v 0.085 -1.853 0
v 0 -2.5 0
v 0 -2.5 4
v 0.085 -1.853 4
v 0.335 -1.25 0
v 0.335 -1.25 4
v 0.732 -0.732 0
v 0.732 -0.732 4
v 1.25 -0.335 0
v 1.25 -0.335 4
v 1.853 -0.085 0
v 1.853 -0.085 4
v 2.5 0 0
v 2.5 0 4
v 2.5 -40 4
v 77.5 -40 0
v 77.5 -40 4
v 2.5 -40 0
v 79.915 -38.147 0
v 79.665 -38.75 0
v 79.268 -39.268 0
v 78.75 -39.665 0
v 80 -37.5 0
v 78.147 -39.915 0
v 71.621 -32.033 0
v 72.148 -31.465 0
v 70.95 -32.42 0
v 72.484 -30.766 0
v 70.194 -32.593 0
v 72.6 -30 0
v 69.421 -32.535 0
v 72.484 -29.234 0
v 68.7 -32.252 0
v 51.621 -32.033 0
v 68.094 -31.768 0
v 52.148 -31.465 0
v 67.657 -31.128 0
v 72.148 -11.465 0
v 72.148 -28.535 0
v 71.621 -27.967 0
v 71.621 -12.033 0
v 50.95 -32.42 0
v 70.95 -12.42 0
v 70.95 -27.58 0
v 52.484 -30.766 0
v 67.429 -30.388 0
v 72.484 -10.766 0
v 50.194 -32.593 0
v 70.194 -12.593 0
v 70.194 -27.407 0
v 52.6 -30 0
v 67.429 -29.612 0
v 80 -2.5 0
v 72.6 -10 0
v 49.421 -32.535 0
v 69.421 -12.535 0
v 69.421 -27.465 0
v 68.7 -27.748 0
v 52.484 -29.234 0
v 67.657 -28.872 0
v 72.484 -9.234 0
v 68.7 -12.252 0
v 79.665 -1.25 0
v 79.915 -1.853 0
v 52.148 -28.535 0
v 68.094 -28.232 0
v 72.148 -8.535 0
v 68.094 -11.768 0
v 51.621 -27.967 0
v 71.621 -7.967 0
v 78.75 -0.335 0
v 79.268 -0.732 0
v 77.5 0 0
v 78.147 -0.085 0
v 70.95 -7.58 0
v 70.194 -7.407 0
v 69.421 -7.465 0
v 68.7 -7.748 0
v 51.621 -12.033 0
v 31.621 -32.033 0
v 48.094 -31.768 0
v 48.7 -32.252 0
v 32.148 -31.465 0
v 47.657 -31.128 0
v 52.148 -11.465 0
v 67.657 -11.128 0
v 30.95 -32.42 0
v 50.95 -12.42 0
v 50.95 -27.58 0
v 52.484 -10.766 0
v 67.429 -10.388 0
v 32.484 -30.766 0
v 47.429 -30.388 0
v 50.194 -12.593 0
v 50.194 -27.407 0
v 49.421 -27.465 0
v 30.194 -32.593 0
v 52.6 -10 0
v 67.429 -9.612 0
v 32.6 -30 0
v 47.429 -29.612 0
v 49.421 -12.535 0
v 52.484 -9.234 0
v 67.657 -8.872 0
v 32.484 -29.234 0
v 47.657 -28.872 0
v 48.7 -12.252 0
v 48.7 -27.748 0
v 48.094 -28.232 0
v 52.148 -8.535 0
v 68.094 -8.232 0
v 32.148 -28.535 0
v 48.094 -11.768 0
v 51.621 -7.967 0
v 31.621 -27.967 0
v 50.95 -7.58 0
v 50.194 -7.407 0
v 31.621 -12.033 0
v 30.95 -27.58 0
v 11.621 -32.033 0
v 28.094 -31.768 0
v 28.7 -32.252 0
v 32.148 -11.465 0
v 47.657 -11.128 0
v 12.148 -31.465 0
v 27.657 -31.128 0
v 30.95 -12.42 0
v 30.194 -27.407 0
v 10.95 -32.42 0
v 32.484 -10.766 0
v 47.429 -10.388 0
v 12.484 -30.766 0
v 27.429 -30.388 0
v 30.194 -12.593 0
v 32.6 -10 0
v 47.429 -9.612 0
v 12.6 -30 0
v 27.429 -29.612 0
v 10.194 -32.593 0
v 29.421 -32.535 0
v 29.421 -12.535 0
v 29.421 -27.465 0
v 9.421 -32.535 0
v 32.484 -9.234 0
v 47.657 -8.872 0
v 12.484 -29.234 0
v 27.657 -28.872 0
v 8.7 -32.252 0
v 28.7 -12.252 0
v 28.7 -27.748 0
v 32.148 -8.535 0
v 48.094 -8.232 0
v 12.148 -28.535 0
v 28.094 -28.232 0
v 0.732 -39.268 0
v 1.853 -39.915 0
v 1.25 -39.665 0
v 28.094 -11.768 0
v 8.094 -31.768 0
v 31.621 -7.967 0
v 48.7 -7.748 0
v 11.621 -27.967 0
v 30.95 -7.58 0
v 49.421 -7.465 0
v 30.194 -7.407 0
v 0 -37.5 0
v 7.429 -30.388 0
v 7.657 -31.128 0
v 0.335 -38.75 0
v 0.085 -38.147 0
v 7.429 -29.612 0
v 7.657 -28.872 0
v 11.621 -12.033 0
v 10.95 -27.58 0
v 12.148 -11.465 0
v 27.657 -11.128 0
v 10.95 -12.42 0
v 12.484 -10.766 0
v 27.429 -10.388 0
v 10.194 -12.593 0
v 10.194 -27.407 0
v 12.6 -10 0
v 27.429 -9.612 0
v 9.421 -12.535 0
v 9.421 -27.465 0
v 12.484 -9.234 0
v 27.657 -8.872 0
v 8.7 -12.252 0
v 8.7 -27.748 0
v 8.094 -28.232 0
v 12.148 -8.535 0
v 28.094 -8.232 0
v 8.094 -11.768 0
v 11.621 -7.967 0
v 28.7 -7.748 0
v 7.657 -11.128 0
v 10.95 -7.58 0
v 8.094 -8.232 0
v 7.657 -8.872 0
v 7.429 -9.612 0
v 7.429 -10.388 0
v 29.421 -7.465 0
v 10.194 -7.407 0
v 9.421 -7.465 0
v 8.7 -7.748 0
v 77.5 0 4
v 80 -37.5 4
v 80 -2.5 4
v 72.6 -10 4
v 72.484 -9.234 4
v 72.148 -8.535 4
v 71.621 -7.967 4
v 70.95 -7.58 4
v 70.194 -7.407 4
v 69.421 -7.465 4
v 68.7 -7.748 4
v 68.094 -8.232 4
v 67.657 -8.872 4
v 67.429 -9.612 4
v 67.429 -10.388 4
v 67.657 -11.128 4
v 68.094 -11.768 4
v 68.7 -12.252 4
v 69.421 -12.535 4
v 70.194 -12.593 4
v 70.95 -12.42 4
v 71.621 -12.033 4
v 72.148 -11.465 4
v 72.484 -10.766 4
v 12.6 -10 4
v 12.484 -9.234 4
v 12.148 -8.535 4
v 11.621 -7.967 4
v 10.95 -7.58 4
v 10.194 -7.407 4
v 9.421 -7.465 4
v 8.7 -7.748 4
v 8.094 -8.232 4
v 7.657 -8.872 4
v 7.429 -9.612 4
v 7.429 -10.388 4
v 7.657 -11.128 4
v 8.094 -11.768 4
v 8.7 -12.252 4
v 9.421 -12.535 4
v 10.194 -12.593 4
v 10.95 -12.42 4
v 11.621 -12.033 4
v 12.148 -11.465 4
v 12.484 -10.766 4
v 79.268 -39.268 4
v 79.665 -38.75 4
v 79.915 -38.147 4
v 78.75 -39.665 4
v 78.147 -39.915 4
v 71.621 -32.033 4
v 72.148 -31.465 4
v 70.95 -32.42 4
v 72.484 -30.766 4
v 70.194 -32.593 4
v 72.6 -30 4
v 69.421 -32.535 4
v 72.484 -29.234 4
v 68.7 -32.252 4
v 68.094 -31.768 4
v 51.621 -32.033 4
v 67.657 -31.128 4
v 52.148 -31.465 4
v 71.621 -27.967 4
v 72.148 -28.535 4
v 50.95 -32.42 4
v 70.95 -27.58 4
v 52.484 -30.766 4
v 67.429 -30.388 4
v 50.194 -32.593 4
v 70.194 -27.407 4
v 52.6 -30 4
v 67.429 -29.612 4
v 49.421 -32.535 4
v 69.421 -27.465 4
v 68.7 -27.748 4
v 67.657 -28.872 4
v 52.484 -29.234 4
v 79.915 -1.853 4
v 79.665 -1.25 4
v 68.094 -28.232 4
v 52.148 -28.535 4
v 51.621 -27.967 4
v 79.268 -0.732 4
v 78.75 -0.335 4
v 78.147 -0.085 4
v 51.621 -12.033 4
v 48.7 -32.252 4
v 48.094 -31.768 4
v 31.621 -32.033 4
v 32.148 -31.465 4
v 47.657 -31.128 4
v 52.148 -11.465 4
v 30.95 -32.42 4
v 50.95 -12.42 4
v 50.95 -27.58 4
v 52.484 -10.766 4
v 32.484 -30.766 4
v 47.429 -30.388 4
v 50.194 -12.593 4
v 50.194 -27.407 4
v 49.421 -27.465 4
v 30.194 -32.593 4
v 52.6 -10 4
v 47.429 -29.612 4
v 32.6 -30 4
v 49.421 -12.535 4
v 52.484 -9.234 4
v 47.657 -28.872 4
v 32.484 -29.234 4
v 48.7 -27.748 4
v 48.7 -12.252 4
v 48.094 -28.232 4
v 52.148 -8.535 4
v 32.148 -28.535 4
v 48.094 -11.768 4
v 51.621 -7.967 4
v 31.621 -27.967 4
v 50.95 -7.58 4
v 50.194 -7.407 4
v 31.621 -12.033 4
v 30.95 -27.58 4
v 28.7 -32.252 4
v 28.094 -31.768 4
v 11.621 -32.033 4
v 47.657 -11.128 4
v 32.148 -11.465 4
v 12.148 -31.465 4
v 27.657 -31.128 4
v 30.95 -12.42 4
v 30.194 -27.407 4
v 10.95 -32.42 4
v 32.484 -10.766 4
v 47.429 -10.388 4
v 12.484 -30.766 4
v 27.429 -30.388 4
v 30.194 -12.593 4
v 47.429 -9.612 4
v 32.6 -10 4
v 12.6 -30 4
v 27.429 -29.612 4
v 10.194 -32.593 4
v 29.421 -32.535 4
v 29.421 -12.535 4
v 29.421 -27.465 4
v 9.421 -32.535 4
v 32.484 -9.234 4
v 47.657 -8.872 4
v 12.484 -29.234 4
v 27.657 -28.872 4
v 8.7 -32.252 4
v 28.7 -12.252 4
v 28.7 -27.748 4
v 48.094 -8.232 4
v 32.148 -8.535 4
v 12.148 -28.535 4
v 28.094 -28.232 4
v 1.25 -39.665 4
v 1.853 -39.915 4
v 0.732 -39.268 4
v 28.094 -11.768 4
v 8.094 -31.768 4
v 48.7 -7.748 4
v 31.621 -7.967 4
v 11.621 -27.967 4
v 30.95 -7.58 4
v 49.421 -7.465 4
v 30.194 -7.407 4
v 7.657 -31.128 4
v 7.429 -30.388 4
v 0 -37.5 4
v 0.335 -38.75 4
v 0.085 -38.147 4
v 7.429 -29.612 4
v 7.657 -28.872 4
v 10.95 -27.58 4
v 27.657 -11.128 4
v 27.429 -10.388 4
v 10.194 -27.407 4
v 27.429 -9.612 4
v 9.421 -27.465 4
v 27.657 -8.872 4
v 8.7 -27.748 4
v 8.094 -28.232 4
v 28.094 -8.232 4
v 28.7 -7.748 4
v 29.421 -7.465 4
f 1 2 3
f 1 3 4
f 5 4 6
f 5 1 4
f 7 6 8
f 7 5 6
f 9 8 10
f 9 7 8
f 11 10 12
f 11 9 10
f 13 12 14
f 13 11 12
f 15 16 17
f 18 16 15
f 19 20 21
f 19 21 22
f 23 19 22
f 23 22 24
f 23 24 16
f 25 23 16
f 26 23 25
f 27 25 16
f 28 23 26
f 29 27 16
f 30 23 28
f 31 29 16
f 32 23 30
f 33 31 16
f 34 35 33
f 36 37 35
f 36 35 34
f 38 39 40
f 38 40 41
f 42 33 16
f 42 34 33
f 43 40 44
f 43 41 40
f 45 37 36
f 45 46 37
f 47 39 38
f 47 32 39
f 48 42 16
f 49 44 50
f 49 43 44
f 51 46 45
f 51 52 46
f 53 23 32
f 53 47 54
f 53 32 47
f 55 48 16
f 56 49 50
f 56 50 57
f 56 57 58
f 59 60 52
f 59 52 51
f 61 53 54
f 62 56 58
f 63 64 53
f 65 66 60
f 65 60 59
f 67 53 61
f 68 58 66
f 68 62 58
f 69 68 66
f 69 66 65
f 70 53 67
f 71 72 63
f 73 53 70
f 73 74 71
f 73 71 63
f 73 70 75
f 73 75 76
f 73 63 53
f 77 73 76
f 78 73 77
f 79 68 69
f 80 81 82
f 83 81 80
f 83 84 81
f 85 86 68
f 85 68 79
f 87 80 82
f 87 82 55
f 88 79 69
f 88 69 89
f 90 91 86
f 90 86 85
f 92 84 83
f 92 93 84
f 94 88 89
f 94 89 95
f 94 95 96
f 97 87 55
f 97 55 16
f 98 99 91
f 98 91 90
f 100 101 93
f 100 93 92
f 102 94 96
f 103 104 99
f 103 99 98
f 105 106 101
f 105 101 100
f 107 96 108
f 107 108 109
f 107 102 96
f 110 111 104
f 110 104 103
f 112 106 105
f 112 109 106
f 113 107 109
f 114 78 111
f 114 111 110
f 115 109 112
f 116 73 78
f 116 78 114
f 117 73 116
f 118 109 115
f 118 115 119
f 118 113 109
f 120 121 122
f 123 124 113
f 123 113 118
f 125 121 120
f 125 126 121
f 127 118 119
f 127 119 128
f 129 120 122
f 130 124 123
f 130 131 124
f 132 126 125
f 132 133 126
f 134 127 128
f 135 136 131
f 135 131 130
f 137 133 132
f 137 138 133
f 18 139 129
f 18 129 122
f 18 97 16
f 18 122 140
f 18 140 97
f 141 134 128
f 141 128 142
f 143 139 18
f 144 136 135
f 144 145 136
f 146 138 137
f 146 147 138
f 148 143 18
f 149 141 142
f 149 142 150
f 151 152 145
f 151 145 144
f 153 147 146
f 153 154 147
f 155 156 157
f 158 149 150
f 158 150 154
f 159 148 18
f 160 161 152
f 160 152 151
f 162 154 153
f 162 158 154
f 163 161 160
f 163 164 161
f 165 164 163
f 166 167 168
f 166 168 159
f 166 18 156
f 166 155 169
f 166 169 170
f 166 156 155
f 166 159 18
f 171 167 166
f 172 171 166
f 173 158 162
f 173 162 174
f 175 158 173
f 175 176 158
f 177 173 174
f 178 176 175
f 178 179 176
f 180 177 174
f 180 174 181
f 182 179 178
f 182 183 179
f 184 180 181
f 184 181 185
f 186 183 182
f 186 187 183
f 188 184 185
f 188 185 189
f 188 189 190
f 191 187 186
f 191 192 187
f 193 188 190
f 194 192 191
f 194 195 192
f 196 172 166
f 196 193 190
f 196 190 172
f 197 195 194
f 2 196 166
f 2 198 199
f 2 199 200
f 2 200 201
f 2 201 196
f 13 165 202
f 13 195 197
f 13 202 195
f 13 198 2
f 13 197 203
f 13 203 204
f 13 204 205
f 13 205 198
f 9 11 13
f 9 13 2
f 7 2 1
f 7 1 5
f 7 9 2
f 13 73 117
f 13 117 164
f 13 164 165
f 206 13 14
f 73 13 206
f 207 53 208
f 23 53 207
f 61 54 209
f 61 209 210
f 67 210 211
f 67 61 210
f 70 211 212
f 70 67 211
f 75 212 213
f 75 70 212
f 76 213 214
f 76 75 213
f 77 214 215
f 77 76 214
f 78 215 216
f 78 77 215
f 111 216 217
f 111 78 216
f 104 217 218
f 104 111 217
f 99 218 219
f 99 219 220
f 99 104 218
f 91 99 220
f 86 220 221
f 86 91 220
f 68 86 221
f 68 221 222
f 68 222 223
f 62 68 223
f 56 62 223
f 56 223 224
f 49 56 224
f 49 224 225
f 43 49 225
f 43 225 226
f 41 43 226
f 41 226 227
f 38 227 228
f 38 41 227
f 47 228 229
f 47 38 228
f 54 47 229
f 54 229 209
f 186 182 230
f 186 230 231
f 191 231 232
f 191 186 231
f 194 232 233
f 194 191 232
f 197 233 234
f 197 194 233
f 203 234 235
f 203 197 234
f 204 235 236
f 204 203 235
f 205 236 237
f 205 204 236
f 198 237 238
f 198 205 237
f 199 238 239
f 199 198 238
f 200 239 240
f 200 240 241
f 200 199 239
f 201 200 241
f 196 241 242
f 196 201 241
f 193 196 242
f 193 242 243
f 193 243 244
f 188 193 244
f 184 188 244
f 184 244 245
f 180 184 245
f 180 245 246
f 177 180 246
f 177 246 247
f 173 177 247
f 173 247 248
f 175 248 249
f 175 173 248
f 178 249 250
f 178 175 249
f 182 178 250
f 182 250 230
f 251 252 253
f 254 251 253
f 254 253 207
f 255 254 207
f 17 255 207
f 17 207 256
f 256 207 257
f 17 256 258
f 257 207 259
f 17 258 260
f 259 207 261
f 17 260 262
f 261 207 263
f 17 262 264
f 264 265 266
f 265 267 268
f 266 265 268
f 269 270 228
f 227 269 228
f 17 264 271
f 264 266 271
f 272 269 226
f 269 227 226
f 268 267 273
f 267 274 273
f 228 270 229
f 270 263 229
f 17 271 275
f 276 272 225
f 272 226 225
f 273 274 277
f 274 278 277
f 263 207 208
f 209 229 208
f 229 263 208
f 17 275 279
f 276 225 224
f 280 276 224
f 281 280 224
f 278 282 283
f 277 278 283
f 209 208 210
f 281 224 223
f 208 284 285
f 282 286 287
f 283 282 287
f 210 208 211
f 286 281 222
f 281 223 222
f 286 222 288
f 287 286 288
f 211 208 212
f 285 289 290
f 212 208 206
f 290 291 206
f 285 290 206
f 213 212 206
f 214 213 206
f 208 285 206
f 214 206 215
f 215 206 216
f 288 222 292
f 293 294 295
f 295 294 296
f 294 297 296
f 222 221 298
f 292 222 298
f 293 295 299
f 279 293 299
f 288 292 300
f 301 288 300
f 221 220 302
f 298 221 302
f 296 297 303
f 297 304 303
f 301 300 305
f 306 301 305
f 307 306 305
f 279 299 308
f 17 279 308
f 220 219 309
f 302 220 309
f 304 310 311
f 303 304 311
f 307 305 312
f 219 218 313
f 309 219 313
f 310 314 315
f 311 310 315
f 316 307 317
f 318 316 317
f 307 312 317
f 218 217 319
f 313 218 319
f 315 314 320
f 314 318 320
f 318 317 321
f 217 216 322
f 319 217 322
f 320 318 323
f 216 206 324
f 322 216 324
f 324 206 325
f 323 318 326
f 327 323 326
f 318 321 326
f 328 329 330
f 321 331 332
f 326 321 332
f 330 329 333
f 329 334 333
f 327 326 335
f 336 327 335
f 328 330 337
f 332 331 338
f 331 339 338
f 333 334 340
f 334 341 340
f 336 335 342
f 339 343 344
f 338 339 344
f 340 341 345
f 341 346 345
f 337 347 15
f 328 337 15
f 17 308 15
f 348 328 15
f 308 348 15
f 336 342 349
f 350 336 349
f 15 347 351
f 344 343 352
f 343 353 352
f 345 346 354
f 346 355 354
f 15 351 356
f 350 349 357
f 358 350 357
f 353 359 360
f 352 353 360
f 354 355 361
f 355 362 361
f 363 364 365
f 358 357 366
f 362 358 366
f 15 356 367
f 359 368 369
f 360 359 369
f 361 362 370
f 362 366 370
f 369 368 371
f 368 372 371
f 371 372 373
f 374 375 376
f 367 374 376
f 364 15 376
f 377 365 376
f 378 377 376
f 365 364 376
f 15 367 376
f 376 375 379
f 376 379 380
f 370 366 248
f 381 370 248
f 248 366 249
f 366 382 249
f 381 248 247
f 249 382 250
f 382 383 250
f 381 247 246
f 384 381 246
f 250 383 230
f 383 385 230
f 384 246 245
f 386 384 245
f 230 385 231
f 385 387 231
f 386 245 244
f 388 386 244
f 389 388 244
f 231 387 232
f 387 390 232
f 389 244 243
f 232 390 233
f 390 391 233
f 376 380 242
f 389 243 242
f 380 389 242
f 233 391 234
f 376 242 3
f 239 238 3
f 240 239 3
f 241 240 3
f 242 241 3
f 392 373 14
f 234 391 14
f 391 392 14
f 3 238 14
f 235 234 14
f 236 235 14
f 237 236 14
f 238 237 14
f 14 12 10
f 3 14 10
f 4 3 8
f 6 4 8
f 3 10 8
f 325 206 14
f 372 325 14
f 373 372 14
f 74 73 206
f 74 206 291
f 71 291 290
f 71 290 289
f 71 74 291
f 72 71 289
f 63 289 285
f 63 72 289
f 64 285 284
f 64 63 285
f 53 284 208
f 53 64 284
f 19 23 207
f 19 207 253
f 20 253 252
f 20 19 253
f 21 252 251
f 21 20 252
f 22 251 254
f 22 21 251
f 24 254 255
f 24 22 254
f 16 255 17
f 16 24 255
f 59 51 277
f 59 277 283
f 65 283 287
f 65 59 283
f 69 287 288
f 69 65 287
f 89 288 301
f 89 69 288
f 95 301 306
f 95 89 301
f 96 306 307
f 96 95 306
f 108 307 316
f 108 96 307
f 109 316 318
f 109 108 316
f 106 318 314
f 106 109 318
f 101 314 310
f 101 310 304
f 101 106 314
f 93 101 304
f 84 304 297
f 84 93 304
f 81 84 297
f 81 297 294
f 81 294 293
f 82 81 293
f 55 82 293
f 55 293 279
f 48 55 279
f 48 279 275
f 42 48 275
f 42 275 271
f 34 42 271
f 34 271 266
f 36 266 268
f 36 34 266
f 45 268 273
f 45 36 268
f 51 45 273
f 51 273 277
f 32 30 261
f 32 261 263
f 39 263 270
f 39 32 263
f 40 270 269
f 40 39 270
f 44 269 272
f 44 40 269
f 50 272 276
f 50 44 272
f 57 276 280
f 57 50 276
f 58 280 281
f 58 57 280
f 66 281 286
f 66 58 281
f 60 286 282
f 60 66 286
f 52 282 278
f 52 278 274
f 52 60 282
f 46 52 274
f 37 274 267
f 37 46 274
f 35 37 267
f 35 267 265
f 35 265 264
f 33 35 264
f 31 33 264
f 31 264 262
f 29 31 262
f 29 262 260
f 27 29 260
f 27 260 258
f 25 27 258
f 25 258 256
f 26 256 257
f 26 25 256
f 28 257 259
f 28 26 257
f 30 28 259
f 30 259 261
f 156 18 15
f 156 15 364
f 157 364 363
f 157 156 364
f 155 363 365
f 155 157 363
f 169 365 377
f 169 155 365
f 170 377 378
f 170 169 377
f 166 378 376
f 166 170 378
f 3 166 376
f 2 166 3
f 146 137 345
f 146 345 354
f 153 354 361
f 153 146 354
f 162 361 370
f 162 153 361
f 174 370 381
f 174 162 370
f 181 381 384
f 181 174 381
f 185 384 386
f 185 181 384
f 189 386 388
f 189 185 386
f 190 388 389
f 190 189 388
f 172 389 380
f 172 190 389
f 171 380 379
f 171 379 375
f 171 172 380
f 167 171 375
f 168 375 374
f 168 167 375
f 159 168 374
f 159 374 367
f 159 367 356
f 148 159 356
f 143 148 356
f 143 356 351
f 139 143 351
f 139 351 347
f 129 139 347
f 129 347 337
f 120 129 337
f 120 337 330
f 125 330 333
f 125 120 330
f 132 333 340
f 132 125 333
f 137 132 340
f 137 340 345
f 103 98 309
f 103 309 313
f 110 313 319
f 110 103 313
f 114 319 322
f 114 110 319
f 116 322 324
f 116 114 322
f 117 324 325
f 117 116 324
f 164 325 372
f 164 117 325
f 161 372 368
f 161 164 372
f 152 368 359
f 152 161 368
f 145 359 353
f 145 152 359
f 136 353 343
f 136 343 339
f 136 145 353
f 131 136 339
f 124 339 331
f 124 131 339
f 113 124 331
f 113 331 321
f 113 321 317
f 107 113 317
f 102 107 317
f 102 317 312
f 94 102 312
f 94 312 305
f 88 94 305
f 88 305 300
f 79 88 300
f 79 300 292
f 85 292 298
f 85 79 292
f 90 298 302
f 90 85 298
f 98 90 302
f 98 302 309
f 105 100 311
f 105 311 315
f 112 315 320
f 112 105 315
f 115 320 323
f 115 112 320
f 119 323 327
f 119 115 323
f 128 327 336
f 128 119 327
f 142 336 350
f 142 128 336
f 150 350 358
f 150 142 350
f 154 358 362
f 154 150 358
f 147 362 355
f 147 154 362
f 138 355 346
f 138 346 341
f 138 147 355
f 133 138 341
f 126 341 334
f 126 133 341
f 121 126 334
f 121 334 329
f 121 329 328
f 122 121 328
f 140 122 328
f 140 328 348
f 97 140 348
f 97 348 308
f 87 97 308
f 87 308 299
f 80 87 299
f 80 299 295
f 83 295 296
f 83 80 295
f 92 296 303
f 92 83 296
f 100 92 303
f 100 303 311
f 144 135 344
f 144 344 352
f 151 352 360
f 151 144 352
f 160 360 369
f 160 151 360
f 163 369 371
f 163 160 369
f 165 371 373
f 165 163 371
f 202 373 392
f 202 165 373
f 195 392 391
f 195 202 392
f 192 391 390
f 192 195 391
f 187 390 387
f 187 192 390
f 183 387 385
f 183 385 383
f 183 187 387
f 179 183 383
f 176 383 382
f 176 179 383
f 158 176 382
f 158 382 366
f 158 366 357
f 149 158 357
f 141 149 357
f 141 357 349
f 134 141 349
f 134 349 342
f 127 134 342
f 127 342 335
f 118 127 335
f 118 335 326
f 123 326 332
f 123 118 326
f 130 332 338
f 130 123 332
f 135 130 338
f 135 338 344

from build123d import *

# Parameters (mm, degrees)
SKETCH_1_R      = 2.6
EXTRUDE_1_DEPTH = 4


with BuildPart() as part:
    # Эскиз1 → Бобышка-Вытянуть1 (new body)
    with BuildSketch(Plane.XY):
        with BuildLine():
            Line((2.5, 0), (77.5, 0))
            ThreePointArc((77.5, 0), (79.267766953, -0.732233047), (80, -2.5))
            Line((80, -2.5), (80, -37.5))
            ThreePointArc((80, -37.5), (79.267766953, -39.267766953), (77.5, -40))
            Line((77.5, -40), (2.5, -40))
            ThreePointArc((2.5, -40), (0.732233047, -39.267766953), (0, -37.5))
            Line((0, -37.5), (0, -2.5))
            ThreePointArc((0, -2.5), (0.732233047, -0.732233047), (2.5, 0))
        make_face()
        with Locations((10, -10)):
            Circle(SKETCH_1_R, mode=Mode.SUBTRACT)
        with Locations((30, -10)):
            Circle(SKETCH_1_R, mode=Mode.SUBTRACT)
        with Locations((50, -10)):
            Circle(SKETCH_1_R, mode=Mode.SUBTRACT)
        with Locations((70, -10)):
            Circle(SKETCH_1_R, mode=Mode.SUBTRACT)
        with Locations((30, -30)):
            Circle(SKETCH_1_R, mode=Mode.SUBTRACT)
        with Locations((50, -30)):
            Circle(SKETCH_1_R, mode=Mode.SUBTRACT)
        with Locations((70, -30)):
            Circle(SKETCH_1_R, mode=Mode.SUBTRACT)
        with Locations((10, -30)):
            Circle(SKETCH_1_R, mode=Mode.SUBTRACT)
    extrude(amount=EXTRUDE_1_DEPTH)


solid = part.part
